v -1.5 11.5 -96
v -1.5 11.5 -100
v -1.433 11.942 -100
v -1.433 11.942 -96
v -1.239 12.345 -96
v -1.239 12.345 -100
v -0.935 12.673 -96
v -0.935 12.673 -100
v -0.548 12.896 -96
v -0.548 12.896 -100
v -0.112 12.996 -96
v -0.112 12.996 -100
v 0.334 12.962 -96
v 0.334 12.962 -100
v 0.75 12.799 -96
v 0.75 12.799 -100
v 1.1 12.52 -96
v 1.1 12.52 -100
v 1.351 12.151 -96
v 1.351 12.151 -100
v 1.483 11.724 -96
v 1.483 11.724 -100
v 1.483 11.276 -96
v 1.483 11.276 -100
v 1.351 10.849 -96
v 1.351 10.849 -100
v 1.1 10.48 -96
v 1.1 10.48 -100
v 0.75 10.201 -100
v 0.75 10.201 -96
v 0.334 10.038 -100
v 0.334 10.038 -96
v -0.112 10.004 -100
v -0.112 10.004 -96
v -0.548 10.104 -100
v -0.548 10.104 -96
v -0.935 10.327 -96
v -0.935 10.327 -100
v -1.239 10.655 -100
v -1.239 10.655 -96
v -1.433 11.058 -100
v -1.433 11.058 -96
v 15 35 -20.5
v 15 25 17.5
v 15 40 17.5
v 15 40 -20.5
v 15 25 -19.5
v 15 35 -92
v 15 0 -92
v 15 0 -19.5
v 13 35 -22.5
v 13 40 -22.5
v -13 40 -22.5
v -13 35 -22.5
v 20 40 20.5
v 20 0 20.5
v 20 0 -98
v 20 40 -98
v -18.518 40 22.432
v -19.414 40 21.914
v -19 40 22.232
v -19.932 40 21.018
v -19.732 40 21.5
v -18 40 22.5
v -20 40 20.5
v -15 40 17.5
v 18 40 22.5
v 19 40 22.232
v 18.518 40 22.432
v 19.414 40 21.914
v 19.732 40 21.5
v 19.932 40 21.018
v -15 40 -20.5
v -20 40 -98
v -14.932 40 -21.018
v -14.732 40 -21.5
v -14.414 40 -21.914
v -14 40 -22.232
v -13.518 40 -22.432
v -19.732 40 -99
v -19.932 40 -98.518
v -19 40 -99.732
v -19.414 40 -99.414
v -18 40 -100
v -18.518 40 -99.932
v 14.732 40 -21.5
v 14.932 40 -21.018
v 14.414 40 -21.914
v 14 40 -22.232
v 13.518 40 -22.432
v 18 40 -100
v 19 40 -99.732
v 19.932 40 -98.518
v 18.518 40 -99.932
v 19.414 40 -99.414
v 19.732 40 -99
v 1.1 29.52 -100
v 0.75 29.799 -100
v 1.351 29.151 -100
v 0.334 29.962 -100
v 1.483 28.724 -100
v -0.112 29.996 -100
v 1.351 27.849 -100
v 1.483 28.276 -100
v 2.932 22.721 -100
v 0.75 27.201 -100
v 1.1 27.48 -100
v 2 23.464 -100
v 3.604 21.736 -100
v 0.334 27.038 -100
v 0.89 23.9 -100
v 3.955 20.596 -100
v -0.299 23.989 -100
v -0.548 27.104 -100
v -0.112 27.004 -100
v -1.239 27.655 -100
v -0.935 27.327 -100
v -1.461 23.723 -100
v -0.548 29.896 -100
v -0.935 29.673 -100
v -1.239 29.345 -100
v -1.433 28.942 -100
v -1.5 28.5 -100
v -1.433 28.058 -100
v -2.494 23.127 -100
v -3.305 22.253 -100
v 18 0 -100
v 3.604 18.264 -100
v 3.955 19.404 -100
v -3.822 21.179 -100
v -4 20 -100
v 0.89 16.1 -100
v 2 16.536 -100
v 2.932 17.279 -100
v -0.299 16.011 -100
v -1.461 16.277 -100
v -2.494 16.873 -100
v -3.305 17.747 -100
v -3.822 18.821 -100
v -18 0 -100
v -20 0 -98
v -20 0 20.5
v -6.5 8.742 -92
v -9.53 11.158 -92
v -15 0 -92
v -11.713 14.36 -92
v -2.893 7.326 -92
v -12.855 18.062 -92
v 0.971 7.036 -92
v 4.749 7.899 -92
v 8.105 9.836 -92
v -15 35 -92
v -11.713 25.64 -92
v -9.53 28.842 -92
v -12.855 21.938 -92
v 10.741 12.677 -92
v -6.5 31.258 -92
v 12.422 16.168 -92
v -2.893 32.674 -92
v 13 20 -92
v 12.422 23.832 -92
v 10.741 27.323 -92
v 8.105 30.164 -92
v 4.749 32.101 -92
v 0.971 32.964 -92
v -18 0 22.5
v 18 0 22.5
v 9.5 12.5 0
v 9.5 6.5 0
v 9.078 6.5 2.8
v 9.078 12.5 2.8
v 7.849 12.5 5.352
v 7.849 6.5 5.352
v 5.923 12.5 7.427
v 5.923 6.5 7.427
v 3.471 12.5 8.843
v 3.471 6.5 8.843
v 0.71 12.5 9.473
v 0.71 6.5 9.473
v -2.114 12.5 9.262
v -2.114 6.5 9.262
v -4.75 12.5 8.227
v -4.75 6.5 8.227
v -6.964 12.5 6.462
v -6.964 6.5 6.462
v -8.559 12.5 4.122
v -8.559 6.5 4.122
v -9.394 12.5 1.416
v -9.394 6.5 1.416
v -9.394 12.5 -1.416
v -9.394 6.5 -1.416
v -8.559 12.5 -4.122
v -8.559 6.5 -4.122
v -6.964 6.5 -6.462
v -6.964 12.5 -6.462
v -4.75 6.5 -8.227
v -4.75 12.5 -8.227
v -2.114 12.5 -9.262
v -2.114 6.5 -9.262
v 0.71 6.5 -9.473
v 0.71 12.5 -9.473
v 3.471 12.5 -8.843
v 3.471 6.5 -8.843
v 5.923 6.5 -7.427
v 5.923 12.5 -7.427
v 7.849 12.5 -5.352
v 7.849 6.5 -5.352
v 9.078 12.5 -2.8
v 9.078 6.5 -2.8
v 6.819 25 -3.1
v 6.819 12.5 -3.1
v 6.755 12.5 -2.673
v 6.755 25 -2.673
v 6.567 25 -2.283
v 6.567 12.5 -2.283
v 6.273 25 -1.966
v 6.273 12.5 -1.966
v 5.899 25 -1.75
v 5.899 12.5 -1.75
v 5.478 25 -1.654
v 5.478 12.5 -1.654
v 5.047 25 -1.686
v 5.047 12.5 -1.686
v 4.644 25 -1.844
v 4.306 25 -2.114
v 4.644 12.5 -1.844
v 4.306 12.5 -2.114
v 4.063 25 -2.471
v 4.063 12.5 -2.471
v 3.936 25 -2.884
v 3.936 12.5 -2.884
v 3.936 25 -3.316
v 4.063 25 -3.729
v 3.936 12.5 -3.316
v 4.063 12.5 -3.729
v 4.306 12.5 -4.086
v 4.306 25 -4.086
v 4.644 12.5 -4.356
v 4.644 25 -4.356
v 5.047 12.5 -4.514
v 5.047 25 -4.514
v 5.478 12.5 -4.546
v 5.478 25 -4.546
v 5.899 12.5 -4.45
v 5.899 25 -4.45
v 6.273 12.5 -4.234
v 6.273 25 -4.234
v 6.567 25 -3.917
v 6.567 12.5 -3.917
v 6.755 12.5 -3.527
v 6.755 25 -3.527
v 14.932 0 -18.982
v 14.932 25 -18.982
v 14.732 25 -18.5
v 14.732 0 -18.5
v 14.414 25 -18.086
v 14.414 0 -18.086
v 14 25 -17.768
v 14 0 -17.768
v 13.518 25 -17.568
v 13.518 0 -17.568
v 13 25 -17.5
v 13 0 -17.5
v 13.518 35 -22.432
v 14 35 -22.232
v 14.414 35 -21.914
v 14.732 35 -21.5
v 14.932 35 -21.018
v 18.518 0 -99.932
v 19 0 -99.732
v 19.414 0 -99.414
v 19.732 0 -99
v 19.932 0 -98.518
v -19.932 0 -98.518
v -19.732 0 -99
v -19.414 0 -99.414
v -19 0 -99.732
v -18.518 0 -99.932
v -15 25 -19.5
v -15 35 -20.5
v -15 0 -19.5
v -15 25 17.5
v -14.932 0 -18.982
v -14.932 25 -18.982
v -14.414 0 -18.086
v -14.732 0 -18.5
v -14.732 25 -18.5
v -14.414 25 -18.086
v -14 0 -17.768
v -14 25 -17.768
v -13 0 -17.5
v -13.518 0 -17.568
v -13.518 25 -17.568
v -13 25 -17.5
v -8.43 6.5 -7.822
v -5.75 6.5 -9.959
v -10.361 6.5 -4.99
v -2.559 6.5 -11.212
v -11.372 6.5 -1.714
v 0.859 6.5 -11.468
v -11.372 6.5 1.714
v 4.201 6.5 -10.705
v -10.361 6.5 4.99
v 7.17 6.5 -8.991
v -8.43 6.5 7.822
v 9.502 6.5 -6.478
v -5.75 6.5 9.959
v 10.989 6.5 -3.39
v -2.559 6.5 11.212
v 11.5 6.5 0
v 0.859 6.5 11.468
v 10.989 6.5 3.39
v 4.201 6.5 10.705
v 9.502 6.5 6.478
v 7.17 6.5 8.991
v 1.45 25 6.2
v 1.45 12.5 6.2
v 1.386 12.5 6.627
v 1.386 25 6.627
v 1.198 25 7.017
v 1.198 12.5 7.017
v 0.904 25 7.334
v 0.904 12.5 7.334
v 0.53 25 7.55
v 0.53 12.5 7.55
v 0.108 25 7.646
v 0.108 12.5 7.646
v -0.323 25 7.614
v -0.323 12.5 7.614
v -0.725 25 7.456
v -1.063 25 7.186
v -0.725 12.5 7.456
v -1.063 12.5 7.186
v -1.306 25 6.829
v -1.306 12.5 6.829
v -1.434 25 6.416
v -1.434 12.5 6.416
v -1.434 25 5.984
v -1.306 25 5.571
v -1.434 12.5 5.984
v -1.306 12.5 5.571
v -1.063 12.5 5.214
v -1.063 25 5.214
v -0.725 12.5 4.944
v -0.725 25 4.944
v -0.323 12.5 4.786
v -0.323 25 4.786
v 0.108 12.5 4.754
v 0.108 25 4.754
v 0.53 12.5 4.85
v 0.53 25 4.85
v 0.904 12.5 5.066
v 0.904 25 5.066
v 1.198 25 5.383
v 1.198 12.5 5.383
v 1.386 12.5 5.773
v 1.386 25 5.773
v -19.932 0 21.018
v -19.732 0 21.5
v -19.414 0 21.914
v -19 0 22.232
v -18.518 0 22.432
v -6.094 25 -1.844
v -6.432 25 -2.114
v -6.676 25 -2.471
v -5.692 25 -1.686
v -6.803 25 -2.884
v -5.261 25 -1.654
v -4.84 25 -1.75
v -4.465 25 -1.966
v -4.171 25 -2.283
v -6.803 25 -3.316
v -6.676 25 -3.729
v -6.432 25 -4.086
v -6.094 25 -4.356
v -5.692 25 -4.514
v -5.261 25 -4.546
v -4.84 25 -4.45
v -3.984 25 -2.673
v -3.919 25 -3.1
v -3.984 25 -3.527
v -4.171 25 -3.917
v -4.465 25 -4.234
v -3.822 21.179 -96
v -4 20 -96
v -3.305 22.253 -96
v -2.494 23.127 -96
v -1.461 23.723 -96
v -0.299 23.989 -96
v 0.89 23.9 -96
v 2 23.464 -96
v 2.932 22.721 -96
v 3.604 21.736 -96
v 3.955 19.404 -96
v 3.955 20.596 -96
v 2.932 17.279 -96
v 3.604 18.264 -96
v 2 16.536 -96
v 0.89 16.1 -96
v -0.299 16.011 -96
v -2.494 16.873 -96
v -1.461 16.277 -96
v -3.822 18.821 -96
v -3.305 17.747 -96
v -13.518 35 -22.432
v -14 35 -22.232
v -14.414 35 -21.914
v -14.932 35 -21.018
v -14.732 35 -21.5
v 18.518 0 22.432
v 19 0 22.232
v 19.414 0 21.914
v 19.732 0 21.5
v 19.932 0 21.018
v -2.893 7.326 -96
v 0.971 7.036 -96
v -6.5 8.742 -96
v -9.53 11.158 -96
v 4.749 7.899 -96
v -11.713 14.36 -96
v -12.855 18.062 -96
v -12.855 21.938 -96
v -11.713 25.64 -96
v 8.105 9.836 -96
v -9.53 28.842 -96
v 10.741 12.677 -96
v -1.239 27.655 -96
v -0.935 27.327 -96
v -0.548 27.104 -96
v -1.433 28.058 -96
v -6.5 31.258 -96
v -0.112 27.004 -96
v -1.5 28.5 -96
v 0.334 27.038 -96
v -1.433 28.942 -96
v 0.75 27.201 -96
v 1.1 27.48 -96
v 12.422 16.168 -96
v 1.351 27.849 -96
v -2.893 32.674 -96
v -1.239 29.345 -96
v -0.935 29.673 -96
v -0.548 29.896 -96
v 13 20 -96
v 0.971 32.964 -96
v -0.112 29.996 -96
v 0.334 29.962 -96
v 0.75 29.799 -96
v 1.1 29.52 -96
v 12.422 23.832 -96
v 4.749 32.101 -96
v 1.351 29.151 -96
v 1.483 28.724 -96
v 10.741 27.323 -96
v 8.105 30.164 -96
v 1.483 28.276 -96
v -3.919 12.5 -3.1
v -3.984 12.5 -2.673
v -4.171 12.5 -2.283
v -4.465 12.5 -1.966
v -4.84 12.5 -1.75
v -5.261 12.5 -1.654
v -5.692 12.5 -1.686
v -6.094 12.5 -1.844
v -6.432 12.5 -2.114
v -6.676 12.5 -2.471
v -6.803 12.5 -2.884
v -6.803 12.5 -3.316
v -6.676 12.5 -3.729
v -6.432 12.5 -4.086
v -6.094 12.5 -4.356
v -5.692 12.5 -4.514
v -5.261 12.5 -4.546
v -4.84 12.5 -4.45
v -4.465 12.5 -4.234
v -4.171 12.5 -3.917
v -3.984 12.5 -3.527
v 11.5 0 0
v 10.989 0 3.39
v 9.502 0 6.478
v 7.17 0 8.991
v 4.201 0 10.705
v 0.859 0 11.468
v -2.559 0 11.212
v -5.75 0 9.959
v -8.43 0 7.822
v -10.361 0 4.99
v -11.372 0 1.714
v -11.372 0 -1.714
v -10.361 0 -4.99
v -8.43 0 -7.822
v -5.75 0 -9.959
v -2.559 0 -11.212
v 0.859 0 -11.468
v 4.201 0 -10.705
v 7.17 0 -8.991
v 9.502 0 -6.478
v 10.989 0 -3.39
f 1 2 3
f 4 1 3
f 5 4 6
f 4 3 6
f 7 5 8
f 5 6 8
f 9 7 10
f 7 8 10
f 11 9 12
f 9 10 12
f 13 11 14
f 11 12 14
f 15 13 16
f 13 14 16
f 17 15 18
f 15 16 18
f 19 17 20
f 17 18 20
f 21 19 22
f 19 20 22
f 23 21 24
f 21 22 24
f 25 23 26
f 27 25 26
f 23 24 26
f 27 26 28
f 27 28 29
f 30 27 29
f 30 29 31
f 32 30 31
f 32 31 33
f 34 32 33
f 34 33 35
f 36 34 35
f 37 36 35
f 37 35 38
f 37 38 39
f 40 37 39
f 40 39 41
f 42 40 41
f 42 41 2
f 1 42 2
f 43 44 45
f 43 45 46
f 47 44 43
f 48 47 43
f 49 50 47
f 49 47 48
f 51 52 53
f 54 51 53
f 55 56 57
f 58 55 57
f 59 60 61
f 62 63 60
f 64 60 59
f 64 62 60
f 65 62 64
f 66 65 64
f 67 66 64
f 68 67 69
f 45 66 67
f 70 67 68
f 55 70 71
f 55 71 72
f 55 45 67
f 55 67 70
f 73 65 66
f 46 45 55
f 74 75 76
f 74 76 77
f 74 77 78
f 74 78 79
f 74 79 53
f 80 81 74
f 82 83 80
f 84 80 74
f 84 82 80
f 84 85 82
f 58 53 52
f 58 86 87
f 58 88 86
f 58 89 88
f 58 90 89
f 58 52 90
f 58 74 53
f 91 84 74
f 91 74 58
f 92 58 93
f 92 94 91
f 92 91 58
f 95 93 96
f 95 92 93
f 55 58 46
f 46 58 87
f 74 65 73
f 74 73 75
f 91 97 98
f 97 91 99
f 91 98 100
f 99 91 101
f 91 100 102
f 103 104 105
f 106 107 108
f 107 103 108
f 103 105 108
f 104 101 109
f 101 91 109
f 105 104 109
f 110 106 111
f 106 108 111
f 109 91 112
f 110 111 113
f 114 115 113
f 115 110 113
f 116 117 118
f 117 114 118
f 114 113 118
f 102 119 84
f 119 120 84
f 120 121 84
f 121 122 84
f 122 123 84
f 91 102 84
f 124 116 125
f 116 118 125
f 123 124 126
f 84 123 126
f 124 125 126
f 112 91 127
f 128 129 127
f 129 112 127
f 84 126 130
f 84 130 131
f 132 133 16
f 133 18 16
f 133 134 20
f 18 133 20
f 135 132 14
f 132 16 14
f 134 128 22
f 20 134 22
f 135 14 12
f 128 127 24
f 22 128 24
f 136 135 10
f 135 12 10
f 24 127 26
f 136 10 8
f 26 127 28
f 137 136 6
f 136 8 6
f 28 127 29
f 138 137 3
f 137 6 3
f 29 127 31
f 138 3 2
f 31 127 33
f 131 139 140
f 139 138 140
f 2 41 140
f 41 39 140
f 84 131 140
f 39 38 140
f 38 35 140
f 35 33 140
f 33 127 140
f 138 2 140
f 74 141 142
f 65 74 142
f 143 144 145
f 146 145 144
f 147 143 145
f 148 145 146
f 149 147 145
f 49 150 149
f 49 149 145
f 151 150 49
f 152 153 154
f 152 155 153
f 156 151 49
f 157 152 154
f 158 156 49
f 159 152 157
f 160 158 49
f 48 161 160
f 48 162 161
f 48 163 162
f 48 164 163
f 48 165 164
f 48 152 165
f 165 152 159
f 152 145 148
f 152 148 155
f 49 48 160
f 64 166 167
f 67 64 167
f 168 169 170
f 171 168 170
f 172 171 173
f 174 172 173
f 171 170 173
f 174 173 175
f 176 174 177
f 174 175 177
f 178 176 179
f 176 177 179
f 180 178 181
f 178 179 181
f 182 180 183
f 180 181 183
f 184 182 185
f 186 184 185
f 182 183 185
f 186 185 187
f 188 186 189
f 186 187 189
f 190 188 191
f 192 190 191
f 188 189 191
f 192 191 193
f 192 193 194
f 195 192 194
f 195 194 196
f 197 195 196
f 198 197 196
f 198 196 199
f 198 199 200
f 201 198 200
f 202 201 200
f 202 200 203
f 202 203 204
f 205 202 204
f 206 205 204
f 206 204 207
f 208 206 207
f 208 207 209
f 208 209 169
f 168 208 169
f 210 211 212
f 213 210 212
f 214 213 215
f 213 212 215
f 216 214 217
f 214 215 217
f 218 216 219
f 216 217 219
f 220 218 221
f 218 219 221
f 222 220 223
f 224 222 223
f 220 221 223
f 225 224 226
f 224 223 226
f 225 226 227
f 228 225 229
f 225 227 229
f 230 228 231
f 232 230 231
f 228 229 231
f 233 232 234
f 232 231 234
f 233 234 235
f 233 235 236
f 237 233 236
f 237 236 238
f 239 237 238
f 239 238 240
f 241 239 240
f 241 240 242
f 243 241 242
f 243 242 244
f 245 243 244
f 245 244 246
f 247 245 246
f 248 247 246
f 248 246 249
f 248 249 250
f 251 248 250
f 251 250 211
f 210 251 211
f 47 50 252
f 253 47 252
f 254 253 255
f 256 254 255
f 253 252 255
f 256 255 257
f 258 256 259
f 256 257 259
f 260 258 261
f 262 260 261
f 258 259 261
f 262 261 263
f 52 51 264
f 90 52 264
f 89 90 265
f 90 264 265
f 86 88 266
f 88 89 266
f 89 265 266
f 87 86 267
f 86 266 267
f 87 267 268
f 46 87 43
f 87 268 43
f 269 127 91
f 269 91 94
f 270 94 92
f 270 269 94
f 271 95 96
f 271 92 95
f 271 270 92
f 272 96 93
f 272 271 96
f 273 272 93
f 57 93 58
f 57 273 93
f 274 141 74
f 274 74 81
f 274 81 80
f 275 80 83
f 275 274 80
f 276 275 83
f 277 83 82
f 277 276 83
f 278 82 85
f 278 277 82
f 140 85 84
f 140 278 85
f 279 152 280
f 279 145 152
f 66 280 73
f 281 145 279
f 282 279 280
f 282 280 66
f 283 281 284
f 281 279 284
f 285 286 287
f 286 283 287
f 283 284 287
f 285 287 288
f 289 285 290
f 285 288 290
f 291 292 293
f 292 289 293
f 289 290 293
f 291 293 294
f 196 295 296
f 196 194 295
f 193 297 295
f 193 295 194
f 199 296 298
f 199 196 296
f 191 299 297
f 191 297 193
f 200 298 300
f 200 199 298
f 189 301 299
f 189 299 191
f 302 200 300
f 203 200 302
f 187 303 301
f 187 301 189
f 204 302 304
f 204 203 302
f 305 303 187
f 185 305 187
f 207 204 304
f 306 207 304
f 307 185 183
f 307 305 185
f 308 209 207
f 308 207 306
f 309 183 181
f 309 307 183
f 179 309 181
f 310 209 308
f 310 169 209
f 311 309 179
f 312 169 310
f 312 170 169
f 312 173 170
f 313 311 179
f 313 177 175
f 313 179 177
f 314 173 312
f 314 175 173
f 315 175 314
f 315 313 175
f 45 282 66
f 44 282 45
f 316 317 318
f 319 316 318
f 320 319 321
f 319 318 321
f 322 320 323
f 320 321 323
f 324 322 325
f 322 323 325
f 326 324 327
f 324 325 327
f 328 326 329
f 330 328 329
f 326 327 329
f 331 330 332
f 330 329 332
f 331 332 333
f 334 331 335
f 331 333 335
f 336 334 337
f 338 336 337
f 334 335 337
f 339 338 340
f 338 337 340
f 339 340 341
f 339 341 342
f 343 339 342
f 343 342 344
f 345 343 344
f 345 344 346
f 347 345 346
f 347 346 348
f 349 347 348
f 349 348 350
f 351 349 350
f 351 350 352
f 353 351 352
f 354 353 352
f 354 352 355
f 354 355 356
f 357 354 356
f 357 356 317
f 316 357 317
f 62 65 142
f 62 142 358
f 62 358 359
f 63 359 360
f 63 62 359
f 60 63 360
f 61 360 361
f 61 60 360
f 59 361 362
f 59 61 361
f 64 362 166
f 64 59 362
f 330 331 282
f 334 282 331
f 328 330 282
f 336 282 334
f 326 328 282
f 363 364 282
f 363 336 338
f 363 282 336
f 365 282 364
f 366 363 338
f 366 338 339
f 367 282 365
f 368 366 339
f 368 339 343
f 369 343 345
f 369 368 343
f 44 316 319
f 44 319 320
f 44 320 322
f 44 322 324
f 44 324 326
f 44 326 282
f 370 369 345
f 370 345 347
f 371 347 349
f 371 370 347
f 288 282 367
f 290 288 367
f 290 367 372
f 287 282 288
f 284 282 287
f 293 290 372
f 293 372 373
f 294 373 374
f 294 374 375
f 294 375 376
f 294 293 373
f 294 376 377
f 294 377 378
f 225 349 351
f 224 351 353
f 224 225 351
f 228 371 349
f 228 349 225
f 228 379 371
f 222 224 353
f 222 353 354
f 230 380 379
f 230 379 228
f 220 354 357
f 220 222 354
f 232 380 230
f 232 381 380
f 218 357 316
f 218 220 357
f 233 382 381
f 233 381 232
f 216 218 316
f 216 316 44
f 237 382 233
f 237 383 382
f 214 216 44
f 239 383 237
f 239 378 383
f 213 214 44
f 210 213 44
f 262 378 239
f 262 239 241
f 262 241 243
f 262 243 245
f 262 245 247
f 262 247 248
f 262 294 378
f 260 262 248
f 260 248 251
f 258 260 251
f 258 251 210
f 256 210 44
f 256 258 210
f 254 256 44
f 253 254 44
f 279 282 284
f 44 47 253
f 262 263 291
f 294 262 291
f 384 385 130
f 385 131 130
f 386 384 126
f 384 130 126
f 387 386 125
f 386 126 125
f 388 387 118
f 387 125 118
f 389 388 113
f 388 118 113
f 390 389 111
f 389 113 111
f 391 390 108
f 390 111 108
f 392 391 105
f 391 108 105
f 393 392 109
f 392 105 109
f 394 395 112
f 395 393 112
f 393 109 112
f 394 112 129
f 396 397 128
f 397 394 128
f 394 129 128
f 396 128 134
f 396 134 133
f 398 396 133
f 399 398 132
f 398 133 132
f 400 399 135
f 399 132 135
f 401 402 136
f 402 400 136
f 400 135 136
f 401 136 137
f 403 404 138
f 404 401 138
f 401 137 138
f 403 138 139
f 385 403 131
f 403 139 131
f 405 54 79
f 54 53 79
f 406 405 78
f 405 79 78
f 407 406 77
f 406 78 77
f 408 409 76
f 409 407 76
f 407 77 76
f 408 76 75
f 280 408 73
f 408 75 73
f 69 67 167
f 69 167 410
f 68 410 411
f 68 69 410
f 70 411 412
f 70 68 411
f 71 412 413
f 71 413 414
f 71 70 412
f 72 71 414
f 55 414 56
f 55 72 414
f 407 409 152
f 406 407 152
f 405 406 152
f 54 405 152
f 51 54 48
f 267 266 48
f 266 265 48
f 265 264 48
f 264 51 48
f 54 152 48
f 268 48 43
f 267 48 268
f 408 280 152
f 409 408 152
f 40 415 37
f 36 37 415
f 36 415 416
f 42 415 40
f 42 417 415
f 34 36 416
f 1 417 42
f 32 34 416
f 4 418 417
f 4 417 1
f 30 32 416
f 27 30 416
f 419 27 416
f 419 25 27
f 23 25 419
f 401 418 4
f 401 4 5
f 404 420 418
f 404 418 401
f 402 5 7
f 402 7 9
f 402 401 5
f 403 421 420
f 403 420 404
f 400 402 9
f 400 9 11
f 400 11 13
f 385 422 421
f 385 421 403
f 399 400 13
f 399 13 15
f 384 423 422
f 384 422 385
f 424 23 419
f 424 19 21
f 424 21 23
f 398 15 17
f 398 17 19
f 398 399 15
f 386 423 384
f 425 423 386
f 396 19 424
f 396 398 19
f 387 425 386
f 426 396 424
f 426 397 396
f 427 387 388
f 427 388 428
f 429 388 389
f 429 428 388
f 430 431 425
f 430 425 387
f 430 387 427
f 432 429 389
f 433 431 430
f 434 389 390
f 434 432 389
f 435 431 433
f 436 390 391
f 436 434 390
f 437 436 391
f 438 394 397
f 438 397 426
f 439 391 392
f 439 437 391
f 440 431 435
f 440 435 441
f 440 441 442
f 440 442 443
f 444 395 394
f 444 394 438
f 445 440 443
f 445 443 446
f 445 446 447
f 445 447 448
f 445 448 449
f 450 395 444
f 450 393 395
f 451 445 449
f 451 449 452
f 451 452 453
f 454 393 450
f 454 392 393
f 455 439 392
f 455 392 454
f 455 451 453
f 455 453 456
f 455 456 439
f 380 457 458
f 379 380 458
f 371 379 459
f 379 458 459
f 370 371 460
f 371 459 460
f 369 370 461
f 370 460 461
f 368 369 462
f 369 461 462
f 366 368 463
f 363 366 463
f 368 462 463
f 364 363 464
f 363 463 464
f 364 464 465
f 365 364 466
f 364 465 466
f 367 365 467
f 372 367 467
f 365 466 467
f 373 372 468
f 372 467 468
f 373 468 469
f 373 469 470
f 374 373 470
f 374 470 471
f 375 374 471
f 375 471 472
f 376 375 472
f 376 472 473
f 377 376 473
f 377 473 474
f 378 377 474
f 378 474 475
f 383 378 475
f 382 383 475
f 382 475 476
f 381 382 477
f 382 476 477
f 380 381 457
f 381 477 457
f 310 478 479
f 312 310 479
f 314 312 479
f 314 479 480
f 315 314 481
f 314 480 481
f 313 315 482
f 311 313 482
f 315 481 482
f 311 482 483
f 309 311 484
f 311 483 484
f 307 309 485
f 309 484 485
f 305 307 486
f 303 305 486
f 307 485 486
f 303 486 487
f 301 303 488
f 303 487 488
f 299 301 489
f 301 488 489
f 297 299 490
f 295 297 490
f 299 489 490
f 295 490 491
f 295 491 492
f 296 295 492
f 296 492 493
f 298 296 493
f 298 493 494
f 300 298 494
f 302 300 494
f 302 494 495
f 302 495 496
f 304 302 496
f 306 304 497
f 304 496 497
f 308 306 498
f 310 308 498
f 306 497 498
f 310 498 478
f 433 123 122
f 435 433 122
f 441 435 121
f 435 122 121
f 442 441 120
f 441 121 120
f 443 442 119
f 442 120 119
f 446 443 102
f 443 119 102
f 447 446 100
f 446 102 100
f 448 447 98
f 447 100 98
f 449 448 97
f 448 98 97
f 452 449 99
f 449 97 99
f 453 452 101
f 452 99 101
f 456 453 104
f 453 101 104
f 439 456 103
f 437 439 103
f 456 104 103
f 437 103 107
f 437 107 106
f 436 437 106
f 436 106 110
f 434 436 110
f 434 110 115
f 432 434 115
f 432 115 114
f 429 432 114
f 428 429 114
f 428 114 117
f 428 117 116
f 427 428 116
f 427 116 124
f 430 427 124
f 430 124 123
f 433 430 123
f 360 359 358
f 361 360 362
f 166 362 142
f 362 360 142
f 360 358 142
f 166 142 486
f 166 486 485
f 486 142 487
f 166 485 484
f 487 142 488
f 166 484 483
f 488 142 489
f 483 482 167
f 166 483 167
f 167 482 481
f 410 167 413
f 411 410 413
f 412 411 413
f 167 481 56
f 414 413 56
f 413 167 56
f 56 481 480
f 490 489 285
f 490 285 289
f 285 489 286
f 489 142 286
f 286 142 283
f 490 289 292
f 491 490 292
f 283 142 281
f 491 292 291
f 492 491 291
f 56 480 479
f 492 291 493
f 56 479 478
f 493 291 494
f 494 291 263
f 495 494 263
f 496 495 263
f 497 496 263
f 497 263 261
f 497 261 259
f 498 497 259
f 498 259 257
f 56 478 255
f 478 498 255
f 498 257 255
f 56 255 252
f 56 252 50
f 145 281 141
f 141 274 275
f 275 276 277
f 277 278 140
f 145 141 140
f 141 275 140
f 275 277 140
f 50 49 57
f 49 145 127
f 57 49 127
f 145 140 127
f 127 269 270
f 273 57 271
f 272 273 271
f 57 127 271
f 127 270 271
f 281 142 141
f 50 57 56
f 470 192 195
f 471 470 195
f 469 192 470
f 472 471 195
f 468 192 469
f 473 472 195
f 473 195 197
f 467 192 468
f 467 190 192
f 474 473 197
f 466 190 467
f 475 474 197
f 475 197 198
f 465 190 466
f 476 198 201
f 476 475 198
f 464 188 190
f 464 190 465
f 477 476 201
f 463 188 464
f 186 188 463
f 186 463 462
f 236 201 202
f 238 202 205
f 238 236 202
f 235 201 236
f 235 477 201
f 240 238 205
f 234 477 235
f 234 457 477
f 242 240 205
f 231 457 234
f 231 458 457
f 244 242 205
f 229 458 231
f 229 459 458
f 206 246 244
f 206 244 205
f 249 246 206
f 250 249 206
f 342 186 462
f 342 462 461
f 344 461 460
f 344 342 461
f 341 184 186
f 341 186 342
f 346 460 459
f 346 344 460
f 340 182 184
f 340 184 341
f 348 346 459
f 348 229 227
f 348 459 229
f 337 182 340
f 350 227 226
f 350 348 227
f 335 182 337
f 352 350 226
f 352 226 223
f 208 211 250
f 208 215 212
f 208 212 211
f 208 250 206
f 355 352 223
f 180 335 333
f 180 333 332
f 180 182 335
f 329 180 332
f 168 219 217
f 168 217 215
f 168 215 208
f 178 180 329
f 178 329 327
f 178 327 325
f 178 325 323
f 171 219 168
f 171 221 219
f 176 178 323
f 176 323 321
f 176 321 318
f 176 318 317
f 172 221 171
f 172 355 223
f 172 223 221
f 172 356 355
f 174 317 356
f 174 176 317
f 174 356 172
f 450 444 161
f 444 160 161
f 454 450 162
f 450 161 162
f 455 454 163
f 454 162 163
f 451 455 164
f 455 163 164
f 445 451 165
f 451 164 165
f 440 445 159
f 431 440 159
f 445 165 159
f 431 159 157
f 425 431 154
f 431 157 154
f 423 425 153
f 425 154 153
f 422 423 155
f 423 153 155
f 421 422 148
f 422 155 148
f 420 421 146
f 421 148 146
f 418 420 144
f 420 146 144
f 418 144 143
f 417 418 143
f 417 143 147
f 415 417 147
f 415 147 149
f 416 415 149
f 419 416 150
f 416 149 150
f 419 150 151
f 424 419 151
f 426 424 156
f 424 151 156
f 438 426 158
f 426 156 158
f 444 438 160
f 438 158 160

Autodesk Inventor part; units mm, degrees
ref_plane "YZ Plane" through (0, 0, 0) normal (1, 0, 0) x (0, 1, 0)
ref_plane "XZ Plane" through (0, 0, 0) normal (0, 1, 0) x (-1, 0, 0)
ref_plane "XY Plane" through (0, 0, 0) normal (0, 0, 1) x (1, 0, 0)
sketch "Sketch1" plane through (0, 0, 0) normal (0, 1, 0) x (-1, 0, 0)
  line L0 (20, 22.5) -> (-20, 22.5)
  line L1 (-20, 22.5) -> (-20, -100)
  line L2 (-20, -100) -> (20, -100)
  line L3 (20, -100) -> (20, 22.5)
  circle A0 centre (0, 0) radius 4
  dimension "d0" = 122.5
  dimension "d1" = 22.5
  dimension "d2" = 40
  dimension "d3" = 20
  dimension "d4" = 8
extrude "Extrusion1" add sketch "Sketch1" along normal blind 5
sketch "Sketch2" plane through (0, 5, 0) normal (0, 1, 0) x (1, 0, 0)
  line L0 (-20, 100) -> (-20, -22.5) projected
  line L1 (20, -22.5) -> (20, 100) projected
  line L2 (-20, -22.5) -> (20, -22.5)
  line L3 (20, -22.5) -> (20, 100)
  line L4 (20, 100) -> (-20, 100)
  line L5 (-20, 100) -> (-20, -22.5)
  line L6 (-15, -17.5) -> (15, -17.5)
  line L7 (15, -17.5) -> (15, 95)
  line L8 (15, 95) -> (-15, 95)
  line L9 (-15, 95) -> (-15, -17.5)
  point P0 (0, 0)
  dimension "d7" = 5
  dimension "d8" = 5
  dimension "d9" = 5
  dimension "d10" = 5
extrude "Extrusion2" add sketch "Sketch2" along normal blind 35
sketch "Sketch3" plane through (0, 40, 0) normal (0, 1, 0) x (1, 0, 0)
  line L0 (-20, 100) -> (-20, -22.5) projected
  line L1 (20, -22.5) -> (20, 100) projected
  line L2 (-20, 100) -> (20, 100)
  line L3 (20, 100) -> (20, 22.5)
  line L4 (20, 22.5) -> (-20, 22.5)
  line L5 (-20, 22.5) -> (-20, 100)
  point P0 (0, 0)
  point P1 (-20, 22.5)
  dimension "d13" = 77.5
extrude "Extrusion3" add sketch "Sketch3" against normal blind 5
sketch "Sketch4" plane through (0, 5, 0) normal (0, 1, 0) x (1, 0, 0)
  line L0 (-15, -17.5) -> (-15, 22.5) projected
  line L1 (15, 22.5) -> (15, -17.5) projected
  line L2 (-15, -17.5) -> (15, -17.5)
  line L3 (15, -17.5) -> (15, 17.5)
  line L4 (15, 17.5) -> (-15, 17.5)
  line L5 (-15, 17.5) -> (-15, -17.5)
  point P0 (0, 0)
  point P1 (-15, 17.5)
  dimension "d16" = 35
extrude "Extrusion4" add sketch "Sketch4" along normal blind 20
sketch "Sketch5" plane through (0, 0, 0) normal (0, -1, 0) x (1, 0, 0)
  circle A0 centre (0, 0) radius 4 projected
  circle A1 centre (0, 0) radius 9.5
  dimension "d19" = 19
extrude "Extrusion5" cut sketch "Sketch5" against normal blind 12.5 contours A0 | A1
sketch "Sketch6" plane through (0, 0, 0) normal (0, -1, 0) x (1, 0, 0)
  circle A0 centre (0, 0) radius 11.5
  dimension "d22" = 23
extrude "Extrusion6" cut sketch "Sketch6" against normal blind 6.5
sketch "Sketch7" plane through (0, 12.5, 0) normal (0, -1, 0) x (1, 0, 0)
  circle A0 centre (0, 0) radius 9.5 projected
  circle A1 centre (0, 0) radius 6.2
  line L0 (0, 0) -> (0, 7.0938)
  line L1 (0, 0) -> (7.0405, -4.0648)
  line L2 (0, 0) -> (-6.9896, -4.0354)
  circle A2 centre (0, 6.2) radius 1.45
  circle A3 centre (5.3694, -3.1) radius 1.45
  circle A4 centre (-5.3694, -3.1) radius 1.45
  dimension "d25" = 12.4
  dimension "d26" = 120
  dimension "d27" = 120
  dimension "d28" = 2.9
  dimension "d29" = 2.9
  dimension "d30" = 2.9
extrude "Extrusion7" cut sketch "Sketch7" against normal blind 18 contours A2 L0 A1 | A1 A2 | A3 L1 A1 | A1 L1 A3 | L0 A2 A1 | L1 A3 A1 | A1 A3 L1 | A4 L2 A1 | A1 L2 A4 | A4 A1 L2 | A4 L2 A1
sketch "Sketch8" plane through (0, 0, 0) normal (0, -1, 0) x (1, 0, 0)
  line L0 (15, -95) -> (-15, -95) projected
  line L1 (-15, -95) -> (-15, -22.5) projected
  line L2 (15, -95) -> (-15, -95)
  line L3 (-15, -95) -> (-15, -17.5)
  line L4 (-15, -17.5) -> (15, -17.5)
  line L5 (15, -17.5) -> (15, -95)
  point P0 (0, 0)
  dimension "d33" = 77.5
extrude "Extrusion8" cut sketch "Sketch8" against normal blind 18
sketch "Sketch9" plane through (-15, 0, -95) normal (0, 0, 1) x (1, 0, 0)
  line L0 (30, 35) -> (0, 35) projected
  line L1 (30, 35) -> (0, 35)
  line L2 (0, 35) -> (0, 0)
  line L3 (0, 0) -> (30, 0)
  line L4 (30, 0) -> (30, 35)
  point P0 (15, 0)
extrude "Extrusion9" add sketch "Sketch9" along normal blind 3
sketch "Sketch10" plane through (20, 0, -100) normal (0, 0, -1) x (-1, 0, 0)
  circle A0 centre (20, 20) radius 4
  line L0 (0, 0) -> (0, 40) projected
  line L1 (0, 0) -> (40, 0) projected
  line L2 (35, 35) -> (5, 35) projected
  line L3 (20, 35) -> (20, 7.5388)
  circle A1 centre (20, 20) radius 8.5
  circle A2 centre (20, 11.5) radius 1.5
  circle A3 centre (20, 28.5) radius 1.5
  point P0 (20, 0)
  dimension "d38" = 20
  dimension "d39" = 20
  dimension "d40" = 8
  dimension "d41" = 17
  dimension "d42" = 3
  dimension "d43" = 3
extrude "Extrusion10" cut sketch "Sketch10" against normal blind 9 contours A0 L3 | L3 A0 | A3 A1 L3 | L3 A1 A3 | A2 A1 L3 | L3 A1 A2 | A1 A3 L3 | L3 A3 A1 | A1 A2 L3 | L3 A2 A1
fillet "Fillet1" radius 2 4 edges at (-20, 20, 22.5) (20, 20, 22.5) (20, 20, -100) (-20, 20, -100)
fillet "Fillet2" radius 2 2 edges at (15, 12.5, -17.5) (-15, 12.5, -17.5)
fillet "Fillet3" radius 2 2 edges at (-15, 37.5, -22.5) (15, 37.5, -22.5)
sketch "Sketch11" plane through (-15, 0, -92) normal (0, 0, 1) x (1, 0, 0)
  circle A0 centre (15, 20) radius 4 projected
  circle A1 centre (15, 20) radius 13
  point P0 (15, 0)
  dimension "d49" = 26
extrude "Extrusion11" cut sketch "Sketch11" against normal blind 4
properties part number "Link6_v2"
